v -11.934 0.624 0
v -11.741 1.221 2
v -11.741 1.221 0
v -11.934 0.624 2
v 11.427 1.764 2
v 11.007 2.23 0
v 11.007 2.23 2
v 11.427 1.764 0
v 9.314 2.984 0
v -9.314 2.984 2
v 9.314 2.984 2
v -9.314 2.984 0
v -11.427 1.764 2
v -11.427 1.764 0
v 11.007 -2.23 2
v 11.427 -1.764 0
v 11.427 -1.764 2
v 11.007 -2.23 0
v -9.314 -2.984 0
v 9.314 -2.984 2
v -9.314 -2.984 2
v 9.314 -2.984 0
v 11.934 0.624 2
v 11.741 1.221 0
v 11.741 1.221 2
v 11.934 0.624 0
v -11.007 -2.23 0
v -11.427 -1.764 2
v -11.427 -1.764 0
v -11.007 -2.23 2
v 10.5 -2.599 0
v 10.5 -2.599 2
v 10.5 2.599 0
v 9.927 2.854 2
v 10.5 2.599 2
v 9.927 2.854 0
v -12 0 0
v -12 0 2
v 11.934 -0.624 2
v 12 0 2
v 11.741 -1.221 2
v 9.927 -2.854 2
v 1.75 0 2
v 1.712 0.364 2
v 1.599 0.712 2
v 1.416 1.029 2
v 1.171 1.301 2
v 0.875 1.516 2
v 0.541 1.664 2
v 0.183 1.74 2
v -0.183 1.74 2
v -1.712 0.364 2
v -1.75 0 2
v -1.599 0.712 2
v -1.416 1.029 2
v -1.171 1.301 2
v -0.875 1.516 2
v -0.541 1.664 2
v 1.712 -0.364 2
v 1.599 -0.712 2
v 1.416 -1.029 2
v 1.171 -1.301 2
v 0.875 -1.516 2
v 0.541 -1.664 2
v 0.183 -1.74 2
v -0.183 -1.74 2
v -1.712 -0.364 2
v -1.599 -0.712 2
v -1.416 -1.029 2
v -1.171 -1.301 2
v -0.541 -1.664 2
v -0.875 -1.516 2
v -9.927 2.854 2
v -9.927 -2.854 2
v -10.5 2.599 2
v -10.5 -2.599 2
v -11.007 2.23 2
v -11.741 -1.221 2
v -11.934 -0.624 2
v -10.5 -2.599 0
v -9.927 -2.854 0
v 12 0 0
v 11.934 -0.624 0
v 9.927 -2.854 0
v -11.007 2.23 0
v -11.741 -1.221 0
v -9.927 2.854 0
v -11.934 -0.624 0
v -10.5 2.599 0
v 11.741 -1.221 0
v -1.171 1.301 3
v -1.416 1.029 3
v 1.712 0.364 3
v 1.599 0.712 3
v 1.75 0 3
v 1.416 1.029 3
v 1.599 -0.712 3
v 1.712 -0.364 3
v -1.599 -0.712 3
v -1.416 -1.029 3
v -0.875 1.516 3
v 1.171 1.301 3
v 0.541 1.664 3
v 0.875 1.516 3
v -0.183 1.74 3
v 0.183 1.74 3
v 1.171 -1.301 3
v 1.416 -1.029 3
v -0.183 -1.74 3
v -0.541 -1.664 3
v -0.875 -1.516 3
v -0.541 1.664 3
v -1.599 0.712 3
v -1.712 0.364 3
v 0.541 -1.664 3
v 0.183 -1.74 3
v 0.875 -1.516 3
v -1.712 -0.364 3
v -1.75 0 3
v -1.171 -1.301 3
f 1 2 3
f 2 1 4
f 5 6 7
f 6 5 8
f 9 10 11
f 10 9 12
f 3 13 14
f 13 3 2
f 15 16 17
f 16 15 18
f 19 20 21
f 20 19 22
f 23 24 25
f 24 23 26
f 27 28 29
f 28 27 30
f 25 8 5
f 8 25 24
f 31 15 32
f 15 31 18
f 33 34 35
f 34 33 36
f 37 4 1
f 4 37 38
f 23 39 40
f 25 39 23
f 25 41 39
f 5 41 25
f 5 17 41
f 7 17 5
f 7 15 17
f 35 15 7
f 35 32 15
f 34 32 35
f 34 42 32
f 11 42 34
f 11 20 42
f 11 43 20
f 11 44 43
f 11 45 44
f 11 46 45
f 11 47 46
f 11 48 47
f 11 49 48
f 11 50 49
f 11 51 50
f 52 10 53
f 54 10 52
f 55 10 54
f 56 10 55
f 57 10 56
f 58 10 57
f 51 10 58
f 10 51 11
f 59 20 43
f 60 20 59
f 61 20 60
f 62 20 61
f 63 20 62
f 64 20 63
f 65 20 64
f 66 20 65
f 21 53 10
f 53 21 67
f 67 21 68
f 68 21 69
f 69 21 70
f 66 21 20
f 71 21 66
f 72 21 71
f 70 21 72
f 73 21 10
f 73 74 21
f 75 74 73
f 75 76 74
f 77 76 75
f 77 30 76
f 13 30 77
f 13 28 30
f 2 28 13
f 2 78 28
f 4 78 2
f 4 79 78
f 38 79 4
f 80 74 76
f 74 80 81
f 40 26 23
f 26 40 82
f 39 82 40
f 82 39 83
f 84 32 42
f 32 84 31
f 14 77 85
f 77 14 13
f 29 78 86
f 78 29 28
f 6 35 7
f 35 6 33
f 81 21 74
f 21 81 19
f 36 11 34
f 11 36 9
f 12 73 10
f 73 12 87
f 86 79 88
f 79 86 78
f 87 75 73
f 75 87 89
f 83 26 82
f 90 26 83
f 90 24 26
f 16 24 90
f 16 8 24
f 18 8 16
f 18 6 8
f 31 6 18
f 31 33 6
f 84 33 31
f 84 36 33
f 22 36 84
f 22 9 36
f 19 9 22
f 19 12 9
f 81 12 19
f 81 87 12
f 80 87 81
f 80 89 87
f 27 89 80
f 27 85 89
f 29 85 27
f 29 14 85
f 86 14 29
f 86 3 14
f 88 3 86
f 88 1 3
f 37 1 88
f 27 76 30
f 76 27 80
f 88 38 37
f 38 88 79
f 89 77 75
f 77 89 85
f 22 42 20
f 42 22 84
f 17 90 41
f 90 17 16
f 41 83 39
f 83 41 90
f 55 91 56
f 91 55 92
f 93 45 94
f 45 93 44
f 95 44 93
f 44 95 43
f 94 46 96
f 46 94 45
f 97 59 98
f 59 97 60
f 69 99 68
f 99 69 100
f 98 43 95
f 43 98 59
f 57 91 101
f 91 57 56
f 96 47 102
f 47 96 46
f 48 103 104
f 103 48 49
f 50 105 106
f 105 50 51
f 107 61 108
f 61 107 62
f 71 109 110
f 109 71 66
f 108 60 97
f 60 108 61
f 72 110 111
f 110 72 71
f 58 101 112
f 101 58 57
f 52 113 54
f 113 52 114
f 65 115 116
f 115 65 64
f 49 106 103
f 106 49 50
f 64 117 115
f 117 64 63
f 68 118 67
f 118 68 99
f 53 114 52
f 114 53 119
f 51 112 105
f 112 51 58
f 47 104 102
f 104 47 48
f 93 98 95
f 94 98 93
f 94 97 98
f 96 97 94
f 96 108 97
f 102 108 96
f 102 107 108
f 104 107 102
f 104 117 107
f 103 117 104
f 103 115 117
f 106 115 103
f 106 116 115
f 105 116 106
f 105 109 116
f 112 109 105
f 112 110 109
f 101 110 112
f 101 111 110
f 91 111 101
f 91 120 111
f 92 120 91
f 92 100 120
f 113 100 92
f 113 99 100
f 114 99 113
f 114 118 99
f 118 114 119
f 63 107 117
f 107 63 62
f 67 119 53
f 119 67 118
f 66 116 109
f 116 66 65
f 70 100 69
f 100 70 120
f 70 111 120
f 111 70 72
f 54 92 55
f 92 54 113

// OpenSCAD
$fs=.1;
d=3.5;//4;
g=1;


/*
difference(){
	rotate([90,0,0])union(){
			scale([1,1,-1])cylinder(d=d,h=1.8);
		hull(){
			translate([0,0,-1.1])scale([(d+g)/d,1,1])cylinder(d=d,h=.001);
			translate([0,0,-1.8])cylinder(d=d,h=.001);
		}
		scale([1,1,2/3])intersection(){
		minkowski(){
			cube([18,.001,.001],center=true);
			sphere(d=6);
		}
		translate([0,0,16])cube(32,center=true);
		}
	}
	//translate([0,0,-16])cube(32,center=true);
	translate([-g/2,.001,-2.5])cube([g,5,5]);
}
*/
		minkowski(){
			cube([18,.001,.001],center=true);
			cylinder(d=6,h=2);
		}
		cylinder(d=d,h=3);
